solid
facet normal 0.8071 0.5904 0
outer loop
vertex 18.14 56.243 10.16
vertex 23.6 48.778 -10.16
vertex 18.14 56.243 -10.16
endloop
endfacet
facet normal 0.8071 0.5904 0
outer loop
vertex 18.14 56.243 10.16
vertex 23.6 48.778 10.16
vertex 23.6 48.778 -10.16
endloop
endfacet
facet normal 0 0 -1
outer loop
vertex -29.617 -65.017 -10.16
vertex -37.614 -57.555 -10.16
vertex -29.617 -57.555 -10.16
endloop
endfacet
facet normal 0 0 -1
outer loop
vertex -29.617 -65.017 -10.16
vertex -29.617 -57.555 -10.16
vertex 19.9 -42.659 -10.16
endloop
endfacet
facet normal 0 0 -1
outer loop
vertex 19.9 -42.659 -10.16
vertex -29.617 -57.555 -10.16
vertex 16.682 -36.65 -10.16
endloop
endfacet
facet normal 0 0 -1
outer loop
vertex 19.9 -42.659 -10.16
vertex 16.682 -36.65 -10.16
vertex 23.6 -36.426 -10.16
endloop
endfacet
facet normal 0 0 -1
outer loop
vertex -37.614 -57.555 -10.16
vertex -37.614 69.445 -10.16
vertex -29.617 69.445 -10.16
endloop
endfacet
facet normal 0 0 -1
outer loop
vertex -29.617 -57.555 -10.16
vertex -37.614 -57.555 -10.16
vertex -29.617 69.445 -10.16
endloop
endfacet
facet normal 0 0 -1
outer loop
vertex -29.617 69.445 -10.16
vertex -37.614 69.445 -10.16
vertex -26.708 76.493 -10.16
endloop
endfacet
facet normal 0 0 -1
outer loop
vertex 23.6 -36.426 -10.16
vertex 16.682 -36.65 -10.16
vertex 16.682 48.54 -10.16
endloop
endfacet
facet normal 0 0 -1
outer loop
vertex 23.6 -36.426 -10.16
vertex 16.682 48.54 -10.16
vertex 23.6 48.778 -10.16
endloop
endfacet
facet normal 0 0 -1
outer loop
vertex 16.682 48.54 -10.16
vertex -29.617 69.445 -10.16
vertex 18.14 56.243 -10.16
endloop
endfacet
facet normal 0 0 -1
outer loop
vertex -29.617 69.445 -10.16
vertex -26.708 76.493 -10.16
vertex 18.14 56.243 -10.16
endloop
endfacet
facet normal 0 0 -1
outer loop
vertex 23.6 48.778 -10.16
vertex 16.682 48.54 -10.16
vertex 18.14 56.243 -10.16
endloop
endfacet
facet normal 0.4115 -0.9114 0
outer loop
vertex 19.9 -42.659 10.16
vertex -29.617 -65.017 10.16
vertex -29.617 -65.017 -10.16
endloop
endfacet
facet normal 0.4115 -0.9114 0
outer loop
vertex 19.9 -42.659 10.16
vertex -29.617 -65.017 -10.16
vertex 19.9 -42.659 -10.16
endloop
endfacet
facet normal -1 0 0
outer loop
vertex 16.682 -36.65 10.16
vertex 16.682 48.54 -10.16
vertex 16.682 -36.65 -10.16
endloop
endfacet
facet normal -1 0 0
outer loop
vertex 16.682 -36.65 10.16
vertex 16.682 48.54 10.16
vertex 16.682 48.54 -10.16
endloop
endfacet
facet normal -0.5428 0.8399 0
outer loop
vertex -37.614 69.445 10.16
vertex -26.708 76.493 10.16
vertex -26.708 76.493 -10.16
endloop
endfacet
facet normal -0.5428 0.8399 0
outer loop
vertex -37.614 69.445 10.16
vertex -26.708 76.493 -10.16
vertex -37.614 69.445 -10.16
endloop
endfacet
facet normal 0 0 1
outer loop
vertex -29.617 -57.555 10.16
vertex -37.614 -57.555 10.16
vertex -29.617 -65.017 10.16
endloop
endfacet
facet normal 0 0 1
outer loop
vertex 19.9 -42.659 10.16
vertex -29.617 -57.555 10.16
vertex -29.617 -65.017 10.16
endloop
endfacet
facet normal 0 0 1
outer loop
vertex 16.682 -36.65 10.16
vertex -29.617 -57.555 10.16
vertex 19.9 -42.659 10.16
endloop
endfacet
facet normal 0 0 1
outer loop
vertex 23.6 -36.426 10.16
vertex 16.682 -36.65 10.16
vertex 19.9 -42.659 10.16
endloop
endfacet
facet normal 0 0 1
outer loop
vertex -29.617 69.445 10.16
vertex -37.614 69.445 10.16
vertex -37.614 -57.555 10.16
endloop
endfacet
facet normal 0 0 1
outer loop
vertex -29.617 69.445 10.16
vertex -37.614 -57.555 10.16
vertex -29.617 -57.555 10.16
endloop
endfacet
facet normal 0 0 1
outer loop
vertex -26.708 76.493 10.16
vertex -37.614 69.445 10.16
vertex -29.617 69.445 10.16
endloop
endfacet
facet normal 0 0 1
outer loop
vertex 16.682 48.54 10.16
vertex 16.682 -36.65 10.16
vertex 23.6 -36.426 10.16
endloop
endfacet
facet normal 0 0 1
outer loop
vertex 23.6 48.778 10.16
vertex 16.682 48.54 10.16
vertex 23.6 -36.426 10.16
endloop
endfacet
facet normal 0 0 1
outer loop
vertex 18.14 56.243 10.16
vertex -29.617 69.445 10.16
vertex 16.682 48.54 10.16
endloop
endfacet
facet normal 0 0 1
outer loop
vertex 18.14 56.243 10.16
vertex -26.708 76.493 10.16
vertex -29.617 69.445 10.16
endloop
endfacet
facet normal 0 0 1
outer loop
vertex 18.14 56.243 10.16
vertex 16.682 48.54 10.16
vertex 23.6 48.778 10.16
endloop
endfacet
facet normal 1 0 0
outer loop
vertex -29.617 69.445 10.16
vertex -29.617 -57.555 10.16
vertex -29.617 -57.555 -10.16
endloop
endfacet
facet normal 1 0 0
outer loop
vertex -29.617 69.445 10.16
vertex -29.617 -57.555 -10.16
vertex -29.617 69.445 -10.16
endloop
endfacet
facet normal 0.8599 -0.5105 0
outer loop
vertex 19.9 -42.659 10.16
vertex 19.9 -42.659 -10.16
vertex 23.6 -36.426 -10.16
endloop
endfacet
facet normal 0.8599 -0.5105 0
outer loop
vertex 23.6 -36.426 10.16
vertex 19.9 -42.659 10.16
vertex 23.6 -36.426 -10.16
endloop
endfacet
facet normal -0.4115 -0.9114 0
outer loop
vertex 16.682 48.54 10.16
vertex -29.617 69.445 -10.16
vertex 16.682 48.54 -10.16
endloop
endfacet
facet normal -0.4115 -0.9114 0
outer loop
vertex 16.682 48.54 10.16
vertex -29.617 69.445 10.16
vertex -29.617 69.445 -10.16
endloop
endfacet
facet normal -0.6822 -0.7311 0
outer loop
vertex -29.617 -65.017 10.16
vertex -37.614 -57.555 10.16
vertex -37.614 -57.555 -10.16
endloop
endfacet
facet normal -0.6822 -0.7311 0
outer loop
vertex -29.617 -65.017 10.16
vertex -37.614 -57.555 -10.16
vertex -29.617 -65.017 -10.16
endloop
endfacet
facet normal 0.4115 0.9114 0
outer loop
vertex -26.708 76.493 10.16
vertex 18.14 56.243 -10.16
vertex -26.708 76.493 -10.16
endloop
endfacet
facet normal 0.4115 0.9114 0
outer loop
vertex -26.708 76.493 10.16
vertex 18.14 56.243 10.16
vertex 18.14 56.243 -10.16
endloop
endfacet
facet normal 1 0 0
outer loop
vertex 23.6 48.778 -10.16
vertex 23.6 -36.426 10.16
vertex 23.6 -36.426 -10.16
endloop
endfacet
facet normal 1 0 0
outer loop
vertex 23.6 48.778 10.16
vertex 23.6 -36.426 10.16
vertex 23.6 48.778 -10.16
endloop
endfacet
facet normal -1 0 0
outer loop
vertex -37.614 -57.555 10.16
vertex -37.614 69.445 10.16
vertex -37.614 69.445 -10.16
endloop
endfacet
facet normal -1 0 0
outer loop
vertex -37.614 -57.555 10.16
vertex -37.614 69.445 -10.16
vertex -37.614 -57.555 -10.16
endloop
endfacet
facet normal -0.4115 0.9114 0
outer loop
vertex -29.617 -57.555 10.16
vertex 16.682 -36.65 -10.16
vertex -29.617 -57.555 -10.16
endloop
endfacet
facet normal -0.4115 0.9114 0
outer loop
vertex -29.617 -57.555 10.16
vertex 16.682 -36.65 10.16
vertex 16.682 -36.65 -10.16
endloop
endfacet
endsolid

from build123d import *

# Parameters (mm, degrees)
F1_DEPTH = 10.16


with BuildPart() as f1:
    # F0 (on Top) → F1 (new body, symmetric)
    with BuildSketch(Plane.XY):
        Polygon((18.139582, 56.243164), (-26.708071, 76.492655), (-37.614409, 69.445336), (-37.614409, -57.554664), (-29.616961, -65.016977), (19.900086, -42.659173), (23.599582, -36.426205), (23.599582, 48.777979), align=None)
        Polygon((-29.616961, -57.554664), (-29.616961, 69.445336), (16.682325, 48.540407), (16.682325, -36.649735), align=None, mode=Mode.SUBTRACT)
    extrude(amount=F1_DEPTH, both=True)


solid = f1.part
